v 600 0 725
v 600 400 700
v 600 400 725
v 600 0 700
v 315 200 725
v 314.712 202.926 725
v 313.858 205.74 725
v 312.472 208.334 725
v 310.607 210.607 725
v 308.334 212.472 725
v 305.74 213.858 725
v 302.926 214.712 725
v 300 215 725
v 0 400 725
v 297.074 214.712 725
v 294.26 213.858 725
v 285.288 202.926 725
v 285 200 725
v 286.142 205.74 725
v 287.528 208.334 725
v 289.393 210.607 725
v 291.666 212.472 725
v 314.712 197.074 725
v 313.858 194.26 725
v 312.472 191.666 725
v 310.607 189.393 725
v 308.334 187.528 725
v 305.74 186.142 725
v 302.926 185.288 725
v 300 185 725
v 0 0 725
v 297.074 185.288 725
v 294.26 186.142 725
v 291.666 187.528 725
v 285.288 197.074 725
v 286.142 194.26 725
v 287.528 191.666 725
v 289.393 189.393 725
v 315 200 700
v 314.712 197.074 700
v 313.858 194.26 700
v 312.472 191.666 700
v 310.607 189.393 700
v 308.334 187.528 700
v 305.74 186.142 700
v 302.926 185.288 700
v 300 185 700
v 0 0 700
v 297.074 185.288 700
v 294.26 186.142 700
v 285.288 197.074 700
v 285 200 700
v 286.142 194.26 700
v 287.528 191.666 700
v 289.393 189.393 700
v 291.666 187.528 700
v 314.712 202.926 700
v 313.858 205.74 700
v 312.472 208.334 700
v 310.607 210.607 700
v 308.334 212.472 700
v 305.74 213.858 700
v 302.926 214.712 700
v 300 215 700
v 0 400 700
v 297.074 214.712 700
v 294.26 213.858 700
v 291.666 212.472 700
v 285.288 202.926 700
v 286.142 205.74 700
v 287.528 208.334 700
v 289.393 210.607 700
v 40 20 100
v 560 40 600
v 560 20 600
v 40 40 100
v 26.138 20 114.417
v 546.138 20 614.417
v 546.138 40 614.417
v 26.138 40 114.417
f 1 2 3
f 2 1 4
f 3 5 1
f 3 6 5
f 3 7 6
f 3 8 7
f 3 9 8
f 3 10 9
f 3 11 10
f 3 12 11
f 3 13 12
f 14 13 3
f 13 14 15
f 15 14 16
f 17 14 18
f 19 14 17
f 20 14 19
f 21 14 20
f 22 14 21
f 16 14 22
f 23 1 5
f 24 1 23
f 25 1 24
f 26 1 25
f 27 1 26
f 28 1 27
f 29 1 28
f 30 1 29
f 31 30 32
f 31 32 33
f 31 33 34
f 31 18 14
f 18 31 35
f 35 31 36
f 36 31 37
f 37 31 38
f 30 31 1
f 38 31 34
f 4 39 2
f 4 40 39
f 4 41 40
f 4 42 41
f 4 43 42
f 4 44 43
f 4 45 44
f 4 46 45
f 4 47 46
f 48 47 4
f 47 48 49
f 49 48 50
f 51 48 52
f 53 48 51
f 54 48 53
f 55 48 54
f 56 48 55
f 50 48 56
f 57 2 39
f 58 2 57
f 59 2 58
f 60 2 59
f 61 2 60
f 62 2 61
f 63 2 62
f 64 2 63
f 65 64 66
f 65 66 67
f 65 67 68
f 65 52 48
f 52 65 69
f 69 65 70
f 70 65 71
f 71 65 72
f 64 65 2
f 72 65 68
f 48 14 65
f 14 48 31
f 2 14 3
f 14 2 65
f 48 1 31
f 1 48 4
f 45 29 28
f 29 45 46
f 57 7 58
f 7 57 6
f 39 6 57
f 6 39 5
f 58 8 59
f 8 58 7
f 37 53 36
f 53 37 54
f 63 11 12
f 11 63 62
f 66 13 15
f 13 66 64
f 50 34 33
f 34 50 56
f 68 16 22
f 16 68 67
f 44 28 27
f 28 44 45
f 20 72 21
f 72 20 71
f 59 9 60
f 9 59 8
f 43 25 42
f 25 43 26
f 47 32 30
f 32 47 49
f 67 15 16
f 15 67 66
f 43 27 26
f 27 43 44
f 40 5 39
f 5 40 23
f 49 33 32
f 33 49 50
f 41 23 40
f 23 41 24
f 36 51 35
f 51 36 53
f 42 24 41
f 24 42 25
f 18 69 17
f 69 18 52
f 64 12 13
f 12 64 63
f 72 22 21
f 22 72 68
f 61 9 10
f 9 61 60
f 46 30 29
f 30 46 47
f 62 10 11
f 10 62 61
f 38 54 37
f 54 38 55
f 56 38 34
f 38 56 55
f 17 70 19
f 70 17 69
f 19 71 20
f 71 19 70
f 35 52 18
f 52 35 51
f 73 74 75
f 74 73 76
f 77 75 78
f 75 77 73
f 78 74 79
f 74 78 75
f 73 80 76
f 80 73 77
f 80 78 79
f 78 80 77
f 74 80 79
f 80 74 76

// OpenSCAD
// Archiyou -> OpenSCAD  |  script: table 0.1.0  |  units: mm
// OpenSCAD has no units: coordinates are in mm.
// Parts: 2 CSG, 0 baked, 0 2D
// Parameters at export, for reference only (nothing in this file is linked to them):
//   WIDTH = 600

$fn = 32;
PART = "";

module top() {
    color([0.69, 0.502, 0.314]) difference() {
        translate([300, 200, 712.5]) cube([600, 400, 25], center = true);
        translate([300, 200, 650]) cylinder(h = 100, r = 15);
    }
}

module brace() {
    multmatrix([[0.720833064902, 0, -0.693108716252, 40], [0, 1, 0, 20], [0.693108716252, 0, 0.720833064902, 100], [0, 0, 0, 1]]) linear_extrude(height = 20) polygon([[0, 0], [721.387551875, 0], [721.387551875, 20], [0, 20]]);
}

// 3D parts
if (PART == "" || PART == "top") top();
if (PART == "" || PART == "brace") brace();
